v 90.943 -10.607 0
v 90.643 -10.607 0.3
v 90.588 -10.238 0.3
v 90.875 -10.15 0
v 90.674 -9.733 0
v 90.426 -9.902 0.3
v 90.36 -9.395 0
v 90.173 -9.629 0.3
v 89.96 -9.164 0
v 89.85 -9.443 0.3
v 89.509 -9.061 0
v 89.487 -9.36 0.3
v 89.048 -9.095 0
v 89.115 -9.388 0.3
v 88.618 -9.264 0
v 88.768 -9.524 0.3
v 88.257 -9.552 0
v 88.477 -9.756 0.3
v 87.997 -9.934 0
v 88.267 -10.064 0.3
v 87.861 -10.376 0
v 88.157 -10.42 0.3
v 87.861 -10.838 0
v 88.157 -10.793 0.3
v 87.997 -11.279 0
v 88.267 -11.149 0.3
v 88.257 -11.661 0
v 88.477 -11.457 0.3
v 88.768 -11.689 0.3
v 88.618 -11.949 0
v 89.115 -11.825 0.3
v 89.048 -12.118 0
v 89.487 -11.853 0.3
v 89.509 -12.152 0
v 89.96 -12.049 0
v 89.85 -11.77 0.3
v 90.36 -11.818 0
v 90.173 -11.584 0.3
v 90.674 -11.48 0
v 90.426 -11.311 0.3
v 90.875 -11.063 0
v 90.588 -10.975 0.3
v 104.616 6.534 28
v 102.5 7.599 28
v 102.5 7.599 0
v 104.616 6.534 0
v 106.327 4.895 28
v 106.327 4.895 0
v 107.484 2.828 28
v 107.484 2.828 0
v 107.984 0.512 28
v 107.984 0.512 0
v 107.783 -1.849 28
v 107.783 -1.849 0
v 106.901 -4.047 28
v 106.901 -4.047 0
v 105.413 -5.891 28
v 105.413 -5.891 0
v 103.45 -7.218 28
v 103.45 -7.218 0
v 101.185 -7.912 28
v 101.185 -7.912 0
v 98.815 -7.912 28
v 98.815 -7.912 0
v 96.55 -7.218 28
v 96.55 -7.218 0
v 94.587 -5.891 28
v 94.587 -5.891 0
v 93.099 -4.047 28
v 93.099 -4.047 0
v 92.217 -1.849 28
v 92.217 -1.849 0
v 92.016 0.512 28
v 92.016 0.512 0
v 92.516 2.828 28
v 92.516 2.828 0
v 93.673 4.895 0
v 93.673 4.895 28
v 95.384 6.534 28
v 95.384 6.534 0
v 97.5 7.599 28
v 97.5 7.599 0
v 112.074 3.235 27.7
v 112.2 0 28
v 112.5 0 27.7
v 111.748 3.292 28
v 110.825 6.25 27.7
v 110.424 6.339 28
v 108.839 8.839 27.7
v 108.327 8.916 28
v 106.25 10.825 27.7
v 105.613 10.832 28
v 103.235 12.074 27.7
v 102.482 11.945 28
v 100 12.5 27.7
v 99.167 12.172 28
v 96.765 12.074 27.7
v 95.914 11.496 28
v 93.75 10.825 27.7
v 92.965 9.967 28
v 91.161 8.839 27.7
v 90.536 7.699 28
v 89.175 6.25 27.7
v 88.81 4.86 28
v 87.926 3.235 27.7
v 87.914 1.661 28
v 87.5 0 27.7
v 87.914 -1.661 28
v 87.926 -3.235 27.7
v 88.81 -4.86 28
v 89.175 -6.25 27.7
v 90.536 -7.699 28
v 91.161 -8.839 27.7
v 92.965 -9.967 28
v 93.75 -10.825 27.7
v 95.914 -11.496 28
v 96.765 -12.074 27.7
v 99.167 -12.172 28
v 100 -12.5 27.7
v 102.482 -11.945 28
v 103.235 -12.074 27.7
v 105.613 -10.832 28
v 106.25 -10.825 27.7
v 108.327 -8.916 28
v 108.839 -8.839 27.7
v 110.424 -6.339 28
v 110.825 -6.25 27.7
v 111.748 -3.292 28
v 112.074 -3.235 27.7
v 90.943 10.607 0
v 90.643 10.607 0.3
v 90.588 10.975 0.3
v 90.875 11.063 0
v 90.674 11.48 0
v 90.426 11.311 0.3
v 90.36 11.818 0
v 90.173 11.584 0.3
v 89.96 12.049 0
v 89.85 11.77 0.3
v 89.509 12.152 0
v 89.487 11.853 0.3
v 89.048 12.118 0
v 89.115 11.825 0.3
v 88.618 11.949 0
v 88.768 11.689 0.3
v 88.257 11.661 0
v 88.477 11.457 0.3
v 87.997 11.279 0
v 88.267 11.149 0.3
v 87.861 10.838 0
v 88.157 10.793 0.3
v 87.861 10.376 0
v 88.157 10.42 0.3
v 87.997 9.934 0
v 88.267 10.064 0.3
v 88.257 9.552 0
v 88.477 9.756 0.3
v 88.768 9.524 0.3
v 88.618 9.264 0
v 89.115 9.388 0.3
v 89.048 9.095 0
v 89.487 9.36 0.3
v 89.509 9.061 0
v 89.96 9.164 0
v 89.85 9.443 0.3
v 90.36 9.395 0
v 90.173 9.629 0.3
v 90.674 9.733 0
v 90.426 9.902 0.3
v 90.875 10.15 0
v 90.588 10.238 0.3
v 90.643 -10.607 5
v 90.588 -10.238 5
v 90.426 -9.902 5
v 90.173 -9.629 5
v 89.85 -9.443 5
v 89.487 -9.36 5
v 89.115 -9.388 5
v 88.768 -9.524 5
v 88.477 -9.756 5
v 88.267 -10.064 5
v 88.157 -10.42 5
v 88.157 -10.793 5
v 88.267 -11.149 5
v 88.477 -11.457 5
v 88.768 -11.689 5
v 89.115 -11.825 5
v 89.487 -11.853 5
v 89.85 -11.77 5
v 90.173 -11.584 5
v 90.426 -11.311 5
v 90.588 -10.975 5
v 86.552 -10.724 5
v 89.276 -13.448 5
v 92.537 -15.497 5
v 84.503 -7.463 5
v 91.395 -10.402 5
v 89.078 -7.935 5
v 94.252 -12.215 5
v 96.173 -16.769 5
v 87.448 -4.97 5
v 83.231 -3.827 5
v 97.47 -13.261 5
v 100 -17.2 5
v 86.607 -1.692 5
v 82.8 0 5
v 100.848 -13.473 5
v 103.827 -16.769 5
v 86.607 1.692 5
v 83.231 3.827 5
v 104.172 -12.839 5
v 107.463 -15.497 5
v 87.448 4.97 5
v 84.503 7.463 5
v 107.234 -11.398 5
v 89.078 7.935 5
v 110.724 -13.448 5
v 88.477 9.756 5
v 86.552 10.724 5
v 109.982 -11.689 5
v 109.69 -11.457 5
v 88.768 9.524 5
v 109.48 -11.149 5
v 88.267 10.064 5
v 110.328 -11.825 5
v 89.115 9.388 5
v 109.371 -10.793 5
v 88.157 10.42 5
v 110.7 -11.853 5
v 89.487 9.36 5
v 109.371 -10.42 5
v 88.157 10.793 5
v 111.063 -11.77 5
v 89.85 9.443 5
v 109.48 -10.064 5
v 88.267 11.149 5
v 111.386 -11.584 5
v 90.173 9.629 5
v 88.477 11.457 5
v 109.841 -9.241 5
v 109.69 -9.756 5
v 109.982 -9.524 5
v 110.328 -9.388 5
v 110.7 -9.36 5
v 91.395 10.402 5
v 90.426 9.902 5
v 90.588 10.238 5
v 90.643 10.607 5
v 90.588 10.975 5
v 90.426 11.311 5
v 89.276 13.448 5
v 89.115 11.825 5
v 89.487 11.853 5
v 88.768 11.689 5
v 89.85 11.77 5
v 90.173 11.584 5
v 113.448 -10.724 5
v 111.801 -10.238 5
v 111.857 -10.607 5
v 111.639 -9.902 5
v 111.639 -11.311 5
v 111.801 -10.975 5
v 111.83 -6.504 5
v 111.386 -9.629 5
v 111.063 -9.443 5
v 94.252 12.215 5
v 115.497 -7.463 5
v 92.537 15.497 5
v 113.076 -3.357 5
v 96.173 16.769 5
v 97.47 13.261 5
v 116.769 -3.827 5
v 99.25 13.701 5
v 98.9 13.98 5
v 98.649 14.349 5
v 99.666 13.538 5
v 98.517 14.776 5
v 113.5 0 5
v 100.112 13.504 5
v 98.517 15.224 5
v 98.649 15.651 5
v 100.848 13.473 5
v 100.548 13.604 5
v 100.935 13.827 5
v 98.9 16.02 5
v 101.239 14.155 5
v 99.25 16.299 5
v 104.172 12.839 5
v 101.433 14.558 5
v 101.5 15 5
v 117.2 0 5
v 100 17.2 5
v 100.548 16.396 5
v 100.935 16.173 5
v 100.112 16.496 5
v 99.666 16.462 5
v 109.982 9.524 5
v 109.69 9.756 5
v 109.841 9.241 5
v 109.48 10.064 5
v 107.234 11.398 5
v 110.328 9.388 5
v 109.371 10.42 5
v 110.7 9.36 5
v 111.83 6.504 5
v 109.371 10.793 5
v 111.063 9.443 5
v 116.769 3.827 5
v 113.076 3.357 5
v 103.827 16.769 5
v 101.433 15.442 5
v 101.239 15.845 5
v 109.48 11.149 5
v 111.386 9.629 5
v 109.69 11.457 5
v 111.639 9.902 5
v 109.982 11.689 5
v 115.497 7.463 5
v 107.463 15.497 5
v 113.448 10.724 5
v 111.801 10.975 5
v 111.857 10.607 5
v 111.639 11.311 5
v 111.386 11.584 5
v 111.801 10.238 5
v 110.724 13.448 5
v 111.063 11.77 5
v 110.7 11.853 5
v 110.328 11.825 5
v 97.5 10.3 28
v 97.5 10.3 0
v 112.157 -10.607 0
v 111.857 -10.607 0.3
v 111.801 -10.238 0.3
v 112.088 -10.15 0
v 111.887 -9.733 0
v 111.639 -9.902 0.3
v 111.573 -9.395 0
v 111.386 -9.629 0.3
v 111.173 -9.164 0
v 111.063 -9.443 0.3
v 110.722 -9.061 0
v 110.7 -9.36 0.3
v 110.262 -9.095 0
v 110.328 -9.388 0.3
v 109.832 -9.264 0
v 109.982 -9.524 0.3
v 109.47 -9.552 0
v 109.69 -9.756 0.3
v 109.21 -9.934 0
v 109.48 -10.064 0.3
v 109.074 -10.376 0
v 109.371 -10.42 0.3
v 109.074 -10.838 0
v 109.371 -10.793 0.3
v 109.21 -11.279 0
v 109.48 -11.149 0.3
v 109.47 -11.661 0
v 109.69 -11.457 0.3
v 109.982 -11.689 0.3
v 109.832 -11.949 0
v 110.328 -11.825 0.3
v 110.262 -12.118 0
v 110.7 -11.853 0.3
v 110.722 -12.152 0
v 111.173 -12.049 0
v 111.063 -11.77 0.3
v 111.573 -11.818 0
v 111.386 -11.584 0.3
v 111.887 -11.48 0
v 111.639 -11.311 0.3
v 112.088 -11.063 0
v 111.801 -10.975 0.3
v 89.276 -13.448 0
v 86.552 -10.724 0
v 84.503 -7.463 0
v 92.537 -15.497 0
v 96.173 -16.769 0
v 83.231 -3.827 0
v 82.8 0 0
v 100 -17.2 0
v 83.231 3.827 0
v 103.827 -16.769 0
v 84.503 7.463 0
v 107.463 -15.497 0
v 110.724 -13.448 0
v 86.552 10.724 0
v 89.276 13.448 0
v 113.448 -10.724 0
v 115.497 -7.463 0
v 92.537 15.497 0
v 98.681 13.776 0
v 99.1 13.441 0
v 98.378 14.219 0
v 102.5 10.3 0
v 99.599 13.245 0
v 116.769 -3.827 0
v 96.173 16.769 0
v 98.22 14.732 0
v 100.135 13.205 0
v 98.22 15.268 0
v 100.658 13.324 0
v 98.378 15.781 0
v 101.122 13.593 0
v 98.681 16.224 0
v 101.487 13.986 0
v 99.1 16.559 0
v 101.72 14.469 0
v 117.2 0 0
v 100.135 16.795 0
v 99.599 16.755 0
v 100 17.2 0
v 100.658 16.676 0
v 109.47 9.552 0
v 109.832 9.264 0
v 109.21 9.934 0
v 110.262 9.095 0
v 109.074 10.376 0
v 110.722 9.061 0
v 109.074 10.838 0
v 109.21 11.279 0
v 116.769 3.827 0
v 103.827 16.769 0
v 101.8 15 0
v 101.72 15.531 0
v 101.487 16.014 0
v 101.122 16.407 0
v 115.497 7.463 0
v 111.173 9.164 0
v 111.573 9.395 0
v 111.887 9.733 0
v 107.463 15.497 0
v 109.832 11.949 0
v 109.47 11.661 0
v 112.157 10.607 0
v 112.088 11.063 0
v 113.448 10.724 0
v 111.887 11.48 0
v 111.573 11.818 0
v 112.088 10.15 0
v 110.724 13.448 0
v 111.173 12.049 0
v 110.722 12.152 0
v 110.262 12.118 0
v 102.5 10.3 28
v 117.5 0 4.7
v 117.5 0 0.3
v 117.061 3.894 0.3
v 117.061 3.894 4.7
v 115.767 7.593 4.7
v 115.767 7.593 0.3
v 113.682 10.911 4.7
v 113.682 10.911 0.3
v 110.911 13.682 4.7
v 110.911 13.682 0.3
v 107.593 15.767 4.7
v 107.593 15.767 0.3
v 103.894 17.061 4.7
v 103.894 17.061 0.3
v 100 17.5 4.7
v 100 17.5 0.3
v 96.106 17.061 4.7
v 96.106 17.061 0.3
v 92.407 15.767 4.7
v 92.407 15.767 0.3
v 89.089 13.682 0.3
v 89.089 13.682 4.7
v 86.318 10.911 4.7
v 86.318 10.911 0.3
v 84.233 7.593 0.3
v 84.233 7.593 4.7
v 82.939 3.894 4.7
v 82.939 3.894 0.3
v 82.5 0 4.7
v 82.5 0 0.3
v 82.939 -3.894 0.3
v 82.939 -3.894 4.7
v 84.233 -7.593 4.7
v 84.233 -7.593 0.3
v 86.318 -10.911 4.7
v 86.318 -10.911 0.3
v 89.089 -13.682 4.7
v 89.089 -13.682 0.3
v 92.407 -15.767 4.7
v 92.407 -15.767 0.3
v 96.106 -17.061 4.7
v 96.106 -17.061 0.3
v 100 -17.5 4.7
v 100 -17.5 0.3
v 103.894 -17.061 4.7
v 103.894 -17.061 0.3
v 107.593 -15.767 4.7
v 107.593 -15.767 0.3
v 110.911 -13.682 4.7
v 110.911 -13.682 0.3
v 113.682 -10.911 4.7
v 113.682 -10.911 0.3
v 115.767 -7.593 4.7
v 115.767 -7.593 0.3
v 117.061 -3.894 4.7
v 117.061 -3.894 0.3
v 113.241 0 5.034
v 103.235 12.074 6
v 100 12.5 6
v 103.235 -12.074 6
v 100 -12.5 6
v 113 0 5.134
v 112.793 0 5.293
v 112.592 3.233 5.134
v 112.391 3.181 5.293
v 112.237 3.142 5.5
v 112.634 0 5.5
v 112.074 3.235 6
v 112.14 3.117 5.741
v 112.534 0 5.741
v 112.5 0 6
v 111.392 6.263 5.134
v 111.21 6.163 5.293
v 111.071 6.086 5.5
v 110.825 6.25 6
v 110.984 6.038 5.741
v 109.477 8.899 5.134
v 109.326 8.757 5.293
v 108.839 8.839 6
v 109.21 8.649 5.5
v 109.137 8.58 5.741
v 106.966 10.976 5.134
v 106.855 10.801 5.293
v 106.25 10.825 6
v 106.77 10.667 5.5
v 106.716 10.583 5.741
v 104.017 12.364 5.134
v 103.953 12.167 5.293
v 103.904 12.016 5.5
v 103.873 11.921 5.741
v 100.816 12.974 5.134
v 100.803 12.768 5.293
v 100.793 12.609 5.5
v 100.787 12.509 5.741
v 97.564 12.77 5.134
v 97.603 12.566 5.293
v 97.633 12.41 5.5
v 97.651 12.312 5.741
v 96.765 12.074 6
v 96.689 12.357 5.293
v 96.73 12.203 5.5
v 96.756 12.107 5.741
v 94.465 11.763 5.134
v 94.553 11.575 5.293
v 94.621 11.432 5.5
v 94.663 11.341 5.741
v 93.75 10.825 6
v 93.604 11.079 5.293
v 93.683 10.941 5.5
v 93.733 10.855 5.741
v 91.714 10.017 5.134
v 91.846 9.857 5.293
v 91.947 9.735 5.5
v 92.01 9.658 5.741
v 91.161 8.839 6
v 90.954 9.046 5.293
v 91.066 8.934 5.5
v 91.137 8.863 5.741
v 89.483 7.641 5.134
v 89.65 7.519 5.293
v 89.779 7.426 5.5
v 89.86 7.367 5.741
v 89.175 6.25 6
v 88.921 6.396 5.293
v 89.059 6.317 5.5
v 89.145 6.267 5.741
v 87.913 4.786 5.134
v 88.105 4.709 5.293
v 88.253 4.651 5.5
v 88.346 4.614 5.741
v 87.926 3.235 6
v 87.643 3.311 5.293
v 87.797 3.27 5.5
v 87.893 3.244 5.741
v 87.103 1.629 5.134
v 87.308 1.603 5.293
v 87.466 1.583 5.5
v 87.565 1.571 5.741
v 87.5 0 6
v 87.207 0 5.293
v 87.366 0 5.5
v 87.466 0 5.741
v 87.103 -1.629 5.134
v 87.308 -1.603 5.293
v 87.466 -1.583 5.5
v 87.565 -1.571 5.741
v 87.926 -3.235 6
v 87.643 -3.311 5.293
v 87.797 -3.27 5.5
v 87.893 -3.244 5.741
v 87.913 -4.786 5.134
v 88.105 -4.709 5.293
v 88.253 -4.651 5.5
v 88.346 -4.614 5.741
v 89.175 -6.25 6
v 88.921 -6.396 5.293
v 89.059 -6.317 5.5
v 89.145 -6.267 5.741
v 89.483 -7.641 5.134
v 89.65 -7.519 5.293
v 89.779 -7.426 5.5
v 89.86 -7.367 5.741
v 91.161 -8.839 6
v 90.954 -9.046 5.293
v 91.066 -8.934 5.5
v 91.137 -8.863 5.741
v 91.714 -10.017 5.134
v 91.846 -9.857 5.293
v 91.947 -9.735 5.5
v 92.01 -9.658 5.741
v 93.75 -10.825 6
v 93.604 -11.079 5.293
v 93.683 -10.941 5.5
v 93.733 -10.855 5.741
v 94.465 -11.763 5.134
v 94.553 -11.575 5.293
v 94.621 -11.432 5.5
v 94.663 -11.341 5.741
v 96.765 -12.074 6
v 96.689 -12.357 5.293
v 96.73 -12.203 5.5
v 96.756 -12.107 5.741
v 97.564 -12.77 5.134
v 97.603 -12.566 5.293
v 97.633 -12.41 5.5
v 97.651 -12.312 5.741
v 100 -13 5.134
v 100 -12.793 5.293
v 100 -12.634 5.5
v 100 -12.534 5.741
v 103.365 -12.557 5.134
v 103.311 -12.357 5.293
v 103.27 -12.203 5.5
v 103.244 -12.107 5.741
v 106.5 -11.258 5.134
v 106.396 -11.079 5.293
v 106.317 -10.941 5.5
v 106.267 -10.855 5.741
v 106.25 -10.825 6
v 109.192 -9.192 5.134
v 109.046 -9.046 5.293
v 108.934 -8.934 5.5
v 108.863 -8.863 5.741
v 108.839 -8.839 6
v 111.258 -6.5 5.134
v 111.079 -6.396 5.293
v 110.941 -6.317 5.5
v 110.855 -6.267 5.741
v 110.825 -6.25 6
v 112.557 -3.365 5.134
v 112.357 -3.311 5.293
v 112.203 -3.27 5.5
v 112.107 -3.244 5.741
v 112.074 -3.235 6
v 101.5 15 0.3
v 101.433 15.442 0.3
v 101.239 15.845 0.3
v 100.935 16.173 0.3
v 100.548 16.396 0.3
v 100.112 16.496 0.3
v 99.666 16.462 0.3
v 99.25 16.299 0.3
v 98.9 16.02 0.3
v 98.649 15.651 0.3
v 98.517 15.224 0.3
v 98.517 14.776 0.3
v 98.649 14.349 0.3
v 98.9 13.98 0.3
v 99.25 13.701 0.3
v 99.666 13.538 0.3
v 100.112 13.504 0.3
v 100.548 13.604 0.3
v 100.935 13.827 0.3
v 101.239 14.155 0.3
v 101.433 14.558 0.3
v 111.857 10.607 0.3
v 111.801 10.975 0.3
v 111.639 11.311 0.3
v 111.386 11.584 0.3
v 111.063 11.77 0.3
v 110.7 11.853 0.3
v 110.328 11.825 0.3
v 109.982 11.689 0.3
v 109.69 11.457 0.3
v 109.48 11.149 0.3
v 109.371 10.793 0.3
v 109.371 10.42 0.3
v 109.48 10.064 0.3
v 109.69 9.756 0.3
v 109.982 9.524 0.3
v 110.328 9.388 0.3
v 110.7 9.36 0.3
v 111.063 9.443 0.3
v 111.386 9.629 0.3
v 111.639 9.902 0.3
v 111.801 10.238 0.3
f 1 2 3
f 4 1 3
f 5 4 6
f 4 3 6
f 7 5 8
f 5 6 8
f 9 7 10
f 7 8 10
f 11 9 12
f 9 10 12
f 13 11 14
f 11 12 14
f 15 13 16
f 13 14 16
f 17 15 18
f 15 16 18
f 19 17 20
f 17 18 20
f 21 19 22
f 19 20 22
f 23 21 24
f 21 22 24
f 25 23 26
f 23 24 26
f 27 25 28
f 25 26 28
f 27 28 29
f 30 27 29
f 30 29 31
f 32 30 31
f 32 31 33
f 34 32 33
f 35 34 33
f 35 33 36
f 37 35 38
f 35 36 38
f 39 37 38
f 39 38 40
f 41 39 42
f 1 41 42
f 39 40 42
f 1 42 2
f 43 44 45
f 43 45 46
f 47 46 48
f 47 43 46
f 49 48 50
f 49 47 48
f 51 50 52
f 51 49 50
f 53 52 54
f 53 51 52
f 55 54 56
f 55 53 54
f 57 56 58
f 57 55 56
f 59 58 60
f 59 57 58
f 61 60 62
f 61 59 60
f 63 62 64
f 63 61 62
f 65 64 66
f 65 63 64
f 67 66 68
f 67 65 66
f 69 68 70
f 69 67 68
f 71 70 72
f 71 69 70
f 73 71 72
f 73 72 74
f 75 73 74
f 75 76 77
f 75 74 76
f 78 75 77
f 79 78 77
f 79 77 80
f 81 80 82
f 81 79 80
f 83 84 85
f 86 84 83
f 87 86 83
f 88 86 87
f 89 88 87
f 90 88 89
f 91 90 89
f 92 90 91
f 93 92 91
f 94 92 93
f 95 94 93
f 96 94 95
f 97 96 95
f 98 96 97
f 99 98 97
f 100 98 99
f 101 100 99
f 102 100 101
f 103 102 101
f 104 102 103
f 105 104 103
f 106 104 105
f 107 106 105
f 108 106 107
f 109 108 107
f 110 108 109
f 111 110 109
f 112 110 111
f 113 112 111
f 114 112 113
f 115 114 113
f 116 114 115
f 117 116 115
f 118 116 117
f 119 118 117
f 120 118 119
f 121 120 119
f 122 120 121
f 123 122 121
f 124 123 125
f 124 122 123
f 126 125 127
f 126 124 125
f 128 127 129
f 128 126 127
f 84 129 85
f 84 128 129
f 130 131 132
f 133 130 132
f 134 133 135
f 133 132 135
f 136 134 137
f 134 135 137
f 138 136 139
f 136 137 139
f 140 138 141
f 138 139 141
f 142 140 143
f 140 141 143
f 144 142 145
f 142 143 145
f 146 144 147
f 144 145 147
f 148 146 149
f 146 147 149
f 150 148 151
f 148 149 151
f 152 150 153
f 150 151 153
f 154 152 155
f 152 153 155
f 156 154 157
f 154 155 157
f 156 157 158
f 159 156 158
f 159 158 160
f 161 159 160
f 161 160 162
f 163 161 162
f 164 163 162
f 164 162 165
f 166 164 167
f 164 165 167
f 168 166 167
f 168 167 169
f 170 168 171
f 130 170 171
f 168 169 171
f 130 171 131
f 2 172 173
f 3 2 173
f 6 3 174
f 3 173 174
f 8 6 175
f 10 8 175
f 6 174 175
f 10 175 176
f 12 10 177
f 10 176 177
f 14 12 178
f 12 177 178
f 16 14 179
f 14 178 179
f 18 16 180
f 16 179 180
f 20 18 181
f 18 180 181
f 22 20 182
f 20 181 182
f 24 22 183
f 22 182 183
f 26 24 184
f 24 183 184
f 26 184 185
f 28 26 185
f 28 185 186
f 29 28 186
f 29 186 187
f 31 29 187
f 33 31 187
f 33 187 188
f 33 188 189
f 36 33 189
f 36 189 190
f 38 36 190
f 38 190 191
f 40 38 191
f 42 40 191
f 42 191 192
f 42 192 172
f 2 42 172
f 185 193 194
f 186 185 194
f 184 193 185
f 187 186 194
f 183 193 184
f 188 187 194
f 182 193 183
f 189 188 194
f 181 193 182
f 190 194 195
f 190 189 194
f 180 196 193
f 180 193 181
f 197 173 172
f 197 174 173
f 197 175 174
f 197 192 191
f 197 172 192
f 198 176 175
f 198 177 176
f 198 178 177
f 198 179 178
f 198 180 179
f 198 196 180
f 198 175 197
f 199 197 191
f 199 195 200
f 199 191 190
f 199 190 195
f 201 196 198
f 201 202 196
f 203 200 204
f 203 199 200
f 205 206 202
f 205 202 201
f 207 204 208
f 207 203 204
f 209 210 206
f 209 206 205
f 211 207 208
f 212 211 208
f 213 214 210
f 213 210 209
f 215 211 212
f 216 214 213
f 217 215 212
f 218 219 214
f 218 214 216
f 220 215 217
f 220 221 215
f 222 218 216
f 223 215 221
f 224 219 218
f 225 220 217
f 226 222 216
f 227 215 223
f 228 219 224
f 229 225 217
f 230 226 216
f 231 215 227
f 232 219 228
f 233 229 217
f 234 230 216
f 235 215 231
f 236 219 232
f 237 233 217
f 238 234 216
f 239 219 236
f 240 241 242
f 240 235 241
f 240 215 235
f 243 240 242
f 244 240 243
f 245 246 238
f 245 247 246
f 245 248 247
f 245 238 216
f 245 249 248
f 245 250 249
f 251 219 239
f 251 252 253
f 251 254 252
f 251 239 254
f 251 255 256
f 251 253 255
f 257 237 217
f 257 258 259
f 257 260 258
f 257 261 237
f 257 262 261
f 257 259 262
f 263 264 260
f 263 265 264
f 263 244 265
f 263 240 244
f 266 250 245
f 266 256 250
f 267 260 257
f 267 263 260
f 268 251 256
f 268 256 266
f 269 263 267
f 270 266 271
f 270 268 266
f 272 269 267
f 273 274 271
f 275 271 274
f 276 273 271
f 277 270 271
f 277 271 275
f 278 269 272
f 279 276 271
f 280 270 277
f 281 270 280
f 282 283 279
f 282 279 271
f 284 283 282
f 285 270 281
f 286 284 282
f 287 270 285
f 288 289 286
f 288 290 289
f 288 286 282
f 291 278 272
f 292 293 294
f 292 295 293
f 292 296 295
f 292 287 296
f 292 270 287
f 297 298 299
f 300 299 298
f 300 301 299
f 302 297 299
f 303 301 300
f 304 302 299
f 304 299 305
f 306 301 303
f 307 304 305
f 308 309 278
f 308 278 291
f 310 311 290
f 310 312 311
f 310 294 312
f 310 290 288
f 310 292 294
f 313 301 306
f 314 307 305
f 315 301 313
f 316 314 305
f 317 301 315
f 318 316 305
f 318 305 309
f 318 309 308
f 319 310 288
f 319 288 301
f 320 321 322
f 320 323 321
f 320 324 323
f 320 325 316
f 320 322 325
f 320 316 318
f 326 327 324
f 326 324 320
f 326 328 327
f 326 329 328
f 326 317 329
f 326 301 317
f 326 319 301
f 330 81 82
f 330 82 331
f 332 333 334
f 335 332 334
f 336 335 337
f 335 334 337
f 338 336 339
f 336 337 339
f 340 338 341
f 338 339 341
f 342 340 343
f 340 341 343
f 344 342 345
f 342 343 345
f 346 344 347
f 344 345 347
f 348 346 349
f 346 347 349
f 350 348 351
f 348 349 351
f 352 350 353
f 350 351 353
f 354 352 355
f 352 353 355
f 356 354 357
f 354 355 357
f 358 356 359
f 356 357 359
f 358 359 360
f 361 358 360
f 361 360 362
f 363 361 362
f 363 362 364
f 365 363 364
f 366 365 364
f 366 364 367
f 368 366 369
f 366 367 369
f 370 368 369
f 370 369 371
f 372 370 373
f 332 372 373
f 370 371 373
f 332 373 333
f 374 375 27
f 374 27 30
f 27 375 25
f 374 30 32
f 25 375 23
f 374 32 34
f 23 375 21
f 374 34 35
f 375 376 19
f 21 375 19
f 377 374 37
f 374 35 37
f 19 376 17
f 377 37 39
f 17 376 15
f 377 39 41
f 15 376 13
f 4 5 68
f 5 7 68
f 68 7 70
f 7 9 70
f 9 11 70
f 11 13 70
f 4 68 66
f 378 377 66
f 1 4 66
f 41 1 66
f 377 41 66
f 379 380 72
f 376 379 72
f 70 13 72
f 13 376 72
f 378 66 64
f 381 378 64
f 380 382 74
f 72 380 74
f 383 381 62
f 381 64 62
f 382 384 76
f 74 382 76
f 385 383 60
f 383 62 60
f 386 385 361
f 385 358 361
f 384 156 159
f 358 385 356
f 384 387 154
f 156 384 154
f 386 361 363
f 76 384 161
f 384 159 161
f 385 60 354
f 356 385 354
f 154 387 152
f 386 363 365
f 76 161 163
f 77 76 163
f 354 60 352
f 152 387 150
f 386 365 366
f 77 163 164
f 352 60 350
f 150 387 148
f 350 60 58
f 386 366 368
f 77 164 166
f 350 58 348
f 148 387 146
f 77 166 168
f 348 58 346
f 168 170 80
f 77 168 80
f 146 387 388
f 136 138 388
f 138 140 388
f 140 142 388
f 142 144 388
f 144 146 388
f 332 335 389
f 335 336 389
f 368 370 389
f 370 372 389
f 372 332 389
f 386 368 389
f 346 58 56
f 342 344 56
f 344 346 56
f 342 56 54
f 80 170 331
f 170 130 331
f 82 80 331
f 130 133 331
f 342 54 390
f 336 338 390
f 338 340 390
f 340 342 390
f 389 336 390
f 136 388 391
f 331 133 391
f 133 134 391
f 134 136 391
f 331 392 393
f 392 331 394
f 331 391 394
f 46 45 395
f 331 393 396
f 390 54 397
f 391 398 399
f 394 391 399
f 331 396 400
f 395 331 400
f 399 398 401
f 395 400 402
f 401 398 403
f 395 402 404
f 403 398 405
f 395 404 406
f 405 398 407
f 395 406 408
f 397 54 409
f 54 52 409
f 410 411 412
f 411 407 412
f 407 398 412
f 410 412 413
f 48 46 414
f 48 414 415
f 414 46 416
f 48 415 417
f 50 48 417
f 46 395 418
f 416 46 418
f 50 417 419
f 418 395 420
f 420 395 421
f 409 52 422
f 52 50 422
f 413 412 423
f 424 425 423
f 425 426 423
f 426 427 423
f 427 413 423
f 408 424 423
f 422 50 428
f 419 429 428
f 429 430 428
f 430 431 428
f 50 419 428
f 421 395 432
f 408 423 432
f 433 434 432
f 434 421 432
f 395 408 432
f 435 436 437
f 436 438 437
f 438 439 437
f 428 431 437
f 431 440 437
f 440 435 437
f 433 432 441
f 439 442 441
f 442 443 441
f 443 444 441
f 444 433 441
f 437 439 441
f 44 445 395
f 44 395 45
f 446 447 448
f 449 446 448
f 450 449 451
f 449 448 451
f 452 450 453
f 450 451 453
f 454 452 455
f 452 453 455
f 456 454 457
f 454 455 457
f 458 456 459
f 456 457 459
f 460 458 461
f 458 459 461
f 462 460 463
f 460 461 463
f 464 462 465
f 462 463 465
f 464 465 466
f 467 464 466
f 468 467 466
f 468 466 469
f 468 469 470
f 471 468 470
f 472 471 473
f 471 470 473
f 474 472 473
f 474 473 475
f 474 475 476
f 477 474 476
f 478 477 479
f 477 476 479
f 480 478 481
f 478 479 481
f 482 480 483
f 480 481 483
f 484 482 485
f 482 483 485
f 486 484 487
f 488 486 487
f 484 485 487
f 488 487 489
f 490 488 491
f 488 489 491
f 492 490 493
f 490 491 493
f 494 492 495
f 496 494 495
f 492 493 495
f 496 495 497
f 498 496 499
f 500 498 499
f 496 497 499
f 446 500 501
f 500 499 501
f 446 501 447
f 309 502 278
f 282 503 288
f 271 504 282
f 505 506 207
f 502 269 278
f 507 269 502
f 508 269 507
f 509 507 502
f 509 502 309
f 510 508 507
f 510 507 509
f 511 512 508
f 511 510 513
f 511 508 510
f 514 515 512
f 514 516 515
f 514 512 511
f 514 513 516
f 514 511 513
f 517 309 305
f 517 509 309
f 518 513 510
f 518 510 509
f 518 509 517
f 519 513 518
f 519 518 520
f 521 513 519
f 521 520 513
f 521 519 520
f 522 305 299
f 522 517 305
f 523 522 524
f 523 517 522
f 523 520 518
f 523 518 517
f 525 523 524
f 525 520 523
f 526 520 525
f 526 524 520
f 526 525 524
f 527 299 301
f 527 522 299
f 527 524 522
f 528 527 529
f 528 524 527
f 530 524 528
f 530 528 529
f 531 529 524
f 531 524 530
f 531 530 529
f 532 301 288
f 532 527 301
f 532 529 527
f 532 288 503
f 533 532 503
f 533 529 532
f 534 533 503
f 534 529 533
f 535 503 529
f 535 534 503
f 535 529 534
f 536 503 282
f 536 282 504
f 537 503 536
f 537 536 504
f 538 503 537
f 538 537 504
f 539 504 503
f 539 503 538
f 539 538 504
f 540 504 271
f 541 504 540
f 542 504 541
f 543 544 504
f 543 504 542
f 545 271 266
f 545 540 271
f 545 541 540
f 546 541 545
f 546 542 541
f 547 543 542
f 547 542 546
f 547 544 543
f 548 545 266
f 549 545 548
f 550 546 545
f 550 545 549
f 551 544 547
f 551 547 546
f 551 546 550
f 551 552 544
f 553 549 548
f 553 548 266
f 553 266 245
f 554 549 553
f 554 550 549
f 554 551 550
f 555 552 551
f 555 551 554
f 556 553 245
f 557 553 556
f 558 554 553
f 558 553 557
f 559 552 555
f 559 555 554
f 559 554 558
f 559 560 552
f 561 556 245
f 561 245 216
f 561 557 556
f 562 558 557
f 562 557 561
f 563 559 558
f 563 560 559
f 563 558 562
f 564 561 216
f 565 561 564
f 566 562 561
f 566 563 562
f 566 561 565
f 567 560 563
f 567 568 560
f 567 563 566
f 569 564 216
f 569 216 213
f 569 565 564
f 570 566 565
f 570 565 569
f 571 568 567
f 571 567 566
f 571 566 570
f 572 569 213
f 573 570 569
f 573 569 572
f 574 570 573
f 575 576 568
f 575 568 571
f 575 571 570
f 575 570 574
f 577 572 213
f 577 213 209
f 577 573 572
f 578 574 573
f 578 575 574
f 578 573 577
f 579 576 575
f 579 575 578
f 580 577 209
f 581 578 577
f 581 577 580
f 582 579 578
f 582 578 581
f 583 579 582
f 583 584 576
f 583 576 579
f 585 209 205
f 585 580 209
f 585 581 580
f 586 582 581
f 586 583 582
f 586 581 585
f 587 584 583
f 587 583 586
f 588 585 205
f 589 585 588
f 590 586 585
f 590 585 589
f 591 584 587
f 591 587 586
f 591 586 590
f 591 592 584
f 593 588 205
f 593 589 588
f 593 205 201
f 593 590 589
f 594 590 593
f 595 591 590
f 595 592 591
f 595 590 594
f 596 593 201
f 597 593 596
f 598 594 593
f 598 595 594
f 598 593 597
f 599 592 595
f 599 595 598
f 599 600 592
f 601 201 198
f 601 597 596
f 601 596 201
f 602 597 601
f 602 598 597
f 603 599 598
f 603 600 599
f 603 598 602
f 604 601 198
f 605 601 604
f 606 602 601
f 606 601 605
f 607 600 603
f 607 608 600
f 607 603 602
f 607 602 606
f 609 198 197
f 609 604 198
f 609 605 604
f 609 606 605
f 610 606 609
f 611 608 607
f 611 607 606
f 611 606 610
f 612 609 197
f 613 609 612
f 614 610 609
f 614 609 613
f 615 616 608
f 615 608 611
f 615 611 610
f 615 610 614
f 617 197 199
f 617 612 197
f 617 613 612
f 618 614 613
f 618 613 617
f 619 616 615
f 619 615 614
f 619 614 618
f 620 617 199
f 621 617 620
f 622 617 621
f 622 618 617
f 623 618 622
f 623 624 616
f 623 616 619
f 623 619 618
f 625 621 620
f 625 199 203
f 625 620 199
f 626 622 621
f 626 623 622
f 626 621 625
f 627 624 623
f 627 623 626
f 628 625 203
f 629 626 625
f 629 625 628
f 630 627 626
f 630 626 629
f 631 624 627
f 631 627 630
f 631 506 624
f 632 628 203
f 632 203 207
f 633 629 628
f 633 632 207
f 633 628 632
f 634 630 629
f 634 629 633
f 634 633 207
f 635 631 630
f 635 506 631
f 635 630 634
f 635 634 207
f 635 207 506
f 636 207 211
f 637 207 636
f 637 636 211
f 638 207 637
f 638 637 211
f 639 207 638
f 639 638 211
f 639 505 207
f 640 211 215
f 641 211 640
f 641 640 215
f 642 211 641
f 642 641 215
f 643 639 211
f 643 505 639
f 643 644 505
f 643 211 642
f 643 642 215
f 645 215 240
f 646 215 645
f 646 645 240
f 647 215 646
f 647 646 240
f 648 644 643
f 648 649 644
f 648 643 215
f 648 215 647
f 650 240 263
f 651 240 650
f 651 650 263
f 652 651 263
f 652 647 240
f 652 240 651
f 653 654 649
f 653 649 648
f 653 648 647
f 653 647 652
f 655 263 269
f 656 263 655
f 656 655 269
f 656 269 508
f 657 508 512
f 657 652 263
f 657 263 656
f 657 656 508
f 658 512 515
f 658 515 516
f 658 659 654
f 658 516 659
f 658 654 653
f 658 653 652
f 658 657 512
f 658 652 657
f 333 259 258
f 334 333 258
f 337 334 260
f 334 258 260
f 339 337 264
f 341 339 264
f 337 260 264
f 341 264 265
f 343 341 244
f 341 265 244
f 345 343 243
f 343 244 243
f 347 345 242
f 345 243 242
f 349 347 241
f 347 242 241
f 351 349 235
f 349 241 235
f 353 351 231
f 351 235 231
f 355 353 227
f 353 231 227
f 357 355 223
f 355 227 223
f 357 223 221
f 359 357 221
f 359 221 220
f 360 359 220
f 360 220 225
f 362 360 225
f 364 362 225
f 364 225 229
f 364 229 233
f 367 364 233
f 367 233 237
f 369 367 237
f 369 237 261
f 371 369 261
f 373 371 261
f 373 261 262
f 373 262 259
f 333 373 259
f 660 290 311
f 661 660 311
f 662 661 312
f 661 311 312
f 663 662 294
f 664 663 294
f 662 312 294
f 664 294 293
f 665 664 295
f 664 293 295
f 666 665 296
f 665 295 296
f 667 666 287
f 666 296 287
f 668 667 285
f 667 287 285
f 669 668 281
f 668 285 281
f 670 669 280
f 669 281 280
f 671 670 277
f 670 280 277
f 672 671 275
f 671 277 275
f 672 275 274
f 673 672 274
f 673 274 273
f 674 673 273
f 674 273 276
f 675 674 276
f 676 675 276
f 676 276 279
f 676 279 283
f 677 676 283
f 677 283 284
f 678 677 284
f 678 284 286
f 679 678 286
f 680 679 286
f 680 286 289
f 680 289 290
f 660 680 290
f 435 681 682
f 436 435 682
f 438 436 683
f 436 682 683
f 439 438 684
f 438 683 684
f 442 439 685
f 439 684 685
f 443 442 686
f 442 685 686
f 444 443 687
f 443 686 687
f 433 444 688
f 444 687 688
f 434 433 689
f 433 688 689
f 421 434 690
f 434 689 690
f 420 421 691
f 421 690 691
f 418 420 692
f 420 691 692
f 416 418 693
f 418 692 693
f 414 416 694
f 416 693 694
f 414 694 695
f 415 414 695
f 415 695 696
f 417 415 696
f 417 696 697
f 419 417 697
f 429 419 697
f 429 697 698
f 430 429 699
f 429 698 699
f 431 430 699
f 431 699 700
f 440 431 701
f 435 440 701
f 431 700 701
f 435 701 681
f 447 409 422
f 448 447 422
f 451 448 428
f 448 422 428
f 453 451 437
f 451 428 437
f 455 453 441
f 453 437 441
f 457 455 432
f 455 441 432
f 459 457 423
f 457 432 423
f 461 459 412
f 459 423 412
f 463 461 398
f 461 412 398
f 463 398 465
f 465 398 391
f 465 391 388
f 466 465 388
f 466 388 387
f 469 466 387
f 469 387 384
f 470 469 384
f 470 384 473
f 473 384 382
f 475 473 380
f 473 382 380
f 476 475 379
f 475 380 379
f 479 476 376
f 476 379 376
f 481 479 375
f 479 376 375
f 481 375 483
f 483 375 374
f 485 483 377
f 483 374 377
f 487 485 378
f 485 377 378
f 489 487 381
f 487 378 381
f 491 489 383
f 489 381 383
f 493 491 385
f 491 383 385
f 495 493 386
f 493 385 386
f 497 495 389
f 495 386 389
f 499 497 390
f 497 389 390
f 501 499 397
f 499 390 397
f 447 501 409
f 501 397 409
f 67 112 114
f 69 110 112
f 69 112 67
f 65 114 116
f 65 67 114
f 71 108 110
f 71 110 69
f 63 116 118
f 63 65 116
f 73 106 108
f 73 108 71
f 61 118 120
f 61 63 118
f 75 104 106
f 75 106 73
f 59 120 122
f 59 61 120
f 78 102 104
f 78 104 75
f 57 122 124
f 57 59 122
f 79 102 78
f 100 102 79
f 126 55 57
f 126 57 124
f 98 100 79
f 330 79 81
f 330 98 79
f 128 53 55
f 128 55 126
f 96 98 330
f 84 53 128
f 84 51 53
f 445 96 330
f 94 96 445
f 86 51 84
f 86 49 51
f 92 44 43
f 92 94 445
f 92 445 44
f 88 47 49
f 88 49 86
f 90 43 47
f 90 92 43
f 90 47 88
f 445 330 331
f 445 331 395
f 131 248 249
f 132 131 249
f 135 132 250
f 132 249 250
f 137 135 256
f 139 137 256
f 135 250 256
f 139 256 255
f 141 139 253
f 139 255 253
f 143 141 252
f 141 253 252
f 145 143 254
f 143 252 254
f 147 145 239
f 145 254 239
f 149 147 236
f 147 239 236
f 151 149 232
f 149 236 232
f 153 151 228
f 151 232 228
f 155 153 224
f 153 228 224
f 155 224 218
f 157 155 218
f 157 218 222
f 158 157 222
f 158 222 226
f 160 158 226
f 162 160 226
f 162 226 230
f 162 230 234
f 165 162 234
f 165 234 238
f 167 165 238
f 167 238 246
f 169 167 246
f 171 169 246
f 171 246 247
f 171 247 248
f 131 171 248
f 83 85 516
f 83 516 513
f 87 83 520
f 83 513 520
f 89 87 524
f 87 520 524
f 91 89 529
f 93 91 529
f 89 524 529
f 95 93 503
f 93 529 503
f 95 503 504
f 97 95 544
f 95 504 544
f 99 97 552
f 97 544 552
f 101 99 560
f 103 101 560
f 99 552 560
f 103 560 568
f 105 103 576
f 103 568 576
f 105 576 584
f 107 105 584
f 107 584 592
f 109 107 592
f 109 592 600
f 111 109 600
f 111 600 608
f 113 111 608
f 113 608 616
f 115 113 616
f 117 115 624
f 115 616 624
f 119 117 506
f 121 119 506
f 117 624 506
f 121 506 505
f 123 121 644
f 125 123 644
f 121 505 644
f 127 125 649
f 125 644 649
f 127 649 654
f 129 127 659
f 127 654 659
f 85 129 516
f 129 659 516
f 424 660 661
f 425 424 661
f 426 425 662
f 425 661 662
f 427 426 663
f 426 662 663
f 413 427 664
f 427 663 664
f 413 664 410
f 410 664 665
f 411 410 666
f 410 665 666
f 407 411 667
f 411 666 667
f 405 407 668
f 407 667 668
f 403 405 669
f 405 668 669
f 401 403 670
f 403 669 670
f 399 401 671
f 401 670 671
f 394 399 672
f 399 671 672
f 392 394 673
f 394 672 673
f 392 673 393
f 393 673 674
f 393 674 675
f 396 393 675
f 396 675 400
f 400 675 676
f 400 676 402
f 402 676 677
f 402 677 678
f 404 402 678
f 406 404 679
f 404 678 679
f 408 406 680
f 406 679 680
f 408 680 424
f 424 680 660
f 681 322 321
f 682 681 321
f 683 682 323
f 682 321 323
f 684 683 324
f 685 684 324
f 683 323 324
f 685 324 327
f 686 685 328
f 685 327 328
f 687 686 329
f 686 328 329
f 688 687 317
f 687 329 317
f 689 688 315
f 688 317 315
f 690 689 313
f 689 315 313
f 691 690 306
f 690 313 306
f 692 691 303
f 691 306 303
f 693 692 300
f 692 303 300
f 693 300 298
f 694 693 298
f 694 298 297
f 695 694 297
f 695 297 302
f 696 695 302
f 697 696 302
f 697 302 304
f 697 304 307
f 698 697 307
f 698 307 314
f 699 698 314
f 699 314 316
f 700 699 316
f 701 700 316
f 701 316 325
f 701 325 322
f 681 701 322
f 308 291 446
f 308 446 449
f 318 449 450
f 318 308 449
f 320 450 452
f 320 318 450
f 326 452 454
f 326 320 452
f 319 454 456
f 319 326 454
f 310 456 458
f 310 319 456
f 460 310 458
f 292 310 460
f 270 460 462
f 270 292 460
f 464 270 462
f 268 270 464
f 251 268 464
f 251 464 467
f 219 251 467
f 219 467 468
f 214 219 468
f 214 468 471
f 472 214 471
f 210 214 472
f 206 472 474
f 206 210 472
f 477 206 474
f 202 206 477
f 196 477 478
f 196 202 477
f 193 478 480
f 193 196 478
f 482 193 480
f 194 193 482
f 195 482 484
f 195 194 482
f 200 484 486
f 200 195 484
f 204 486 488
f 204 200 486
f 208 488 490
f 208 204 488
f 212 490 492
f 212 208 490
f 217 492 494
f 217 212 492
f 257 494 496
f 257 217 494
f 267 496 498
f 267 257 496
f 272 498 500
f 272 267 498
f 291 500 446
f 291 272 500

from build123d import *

# Parameters (mm, degrees)
SKETCH1_R             = 17.5
BOSS_EXTRUDE1_DEPTH   = 5
F_3_0MM_DOWEL_HOLE1_D = 3
M3X0_5_TAPPED_HOLE1_D = 2.5
SKETCH10_R            = 12.5
BOSS_EXTRUDE2_DEPTH   = 23
CHAMFER1_SIZE         = 0.3
KEYWAY_DEPTH          = 39.539297239
FILLET1_R             = 1


with BuildPart() as part:
    # Sketch1 → Boss-Extrude1 (new body)
    with BuildSketch(Plane.XY):
        with Locations((100, 0)):
            Circle(SKETCH1_R)
    extrude(amount=BOSS_EXTRUDE1_DEPTH)

    # Ø3.0mm Dowel Hole1 (through all)
    with Locations(Plane(origin=(0, 0, 0), x_dir=(-1, 0, 0), z_dir=(0, 0, -1))):
        with Locations((-100, 15)):
            Hole(F_3_0MM_DOWEL_HOLE1_D / 2)

    # M3x0.5 Tapped Hole1 (through all)
    with Locations(Plane(origin=(0, 0, 0), x_dir=(-1, 0, 0), z_dir=(0, 0, -1))):
        with Locations((-110.606601718, 10.606601718), (-89.393398282, 10.606601718), (-110.606601718, -10.606601718), (-89.393398282, -10.606601718)):
            Hole(M3X0_5_TAPPED_HOLE1_D / 2)

    # Sketch10 → Boss-Extrude2 (add)
    with BuildSketch(Plane.XY.offset(5)):
        with Locations((100, 0)):
            Circle(SKETCH10_R)
    extrude(amount=BOSS_EXTRUDE2_DEPTH)

    # Chamfer1
    chamfer1_edges = [part.edges().sort_by_distance(p)[0] for p in [
        (88.143398282, -10.606601718, 0),
        (82.5, 0, 0),
        (109.356601718, -10.606601718, 0),
        (88.143398282, 10.606601718, 0),
        (109.356601718, 10.606601718, 0),
        (87.5, 0, 28),
        (82.5, 0, 5),
        (98.5, 15, 0),
    ]]
    chamfer(chamfer1_edges, length=CHAMFER1_SIZE)

    # KeySketch → Keyway (cut, through all)
    with BuildSketch(Plane(origin=(101.36896109, 1.08062806, 28), x_dir=(1, 0, 0), z_dir=(0, 0, 1))):
        with BuildLine():
            Line((-3.86896109, 6.518714017), (-3.86896109, 9.21937194))
            Line((-3.86896109, 9.21937194), (1.13103891, 9.21937194))
            Line((1.13103891, 9.21937194), (1.13103891, 6.518714017))
            ThreePointArc((1.13103891, 6.518714017), (-1.36896109, -9.08062806), (-3.86896109, 6.518714017))
        make_face()
    extrude(amount=-KEYWAY_DEPTH, mode=Mode.SUBTRACT)

    # Fillet1
    fillet1_edges = [part.edges().sort_by_distance(p)[0] for p in [
        (87.5, 0, 5),
    ]]
    fillet(fillet1_edges, radius=FILLET1_R - 0.0001)  # a hair under: the kernel refuses the full size


solid = part.part
